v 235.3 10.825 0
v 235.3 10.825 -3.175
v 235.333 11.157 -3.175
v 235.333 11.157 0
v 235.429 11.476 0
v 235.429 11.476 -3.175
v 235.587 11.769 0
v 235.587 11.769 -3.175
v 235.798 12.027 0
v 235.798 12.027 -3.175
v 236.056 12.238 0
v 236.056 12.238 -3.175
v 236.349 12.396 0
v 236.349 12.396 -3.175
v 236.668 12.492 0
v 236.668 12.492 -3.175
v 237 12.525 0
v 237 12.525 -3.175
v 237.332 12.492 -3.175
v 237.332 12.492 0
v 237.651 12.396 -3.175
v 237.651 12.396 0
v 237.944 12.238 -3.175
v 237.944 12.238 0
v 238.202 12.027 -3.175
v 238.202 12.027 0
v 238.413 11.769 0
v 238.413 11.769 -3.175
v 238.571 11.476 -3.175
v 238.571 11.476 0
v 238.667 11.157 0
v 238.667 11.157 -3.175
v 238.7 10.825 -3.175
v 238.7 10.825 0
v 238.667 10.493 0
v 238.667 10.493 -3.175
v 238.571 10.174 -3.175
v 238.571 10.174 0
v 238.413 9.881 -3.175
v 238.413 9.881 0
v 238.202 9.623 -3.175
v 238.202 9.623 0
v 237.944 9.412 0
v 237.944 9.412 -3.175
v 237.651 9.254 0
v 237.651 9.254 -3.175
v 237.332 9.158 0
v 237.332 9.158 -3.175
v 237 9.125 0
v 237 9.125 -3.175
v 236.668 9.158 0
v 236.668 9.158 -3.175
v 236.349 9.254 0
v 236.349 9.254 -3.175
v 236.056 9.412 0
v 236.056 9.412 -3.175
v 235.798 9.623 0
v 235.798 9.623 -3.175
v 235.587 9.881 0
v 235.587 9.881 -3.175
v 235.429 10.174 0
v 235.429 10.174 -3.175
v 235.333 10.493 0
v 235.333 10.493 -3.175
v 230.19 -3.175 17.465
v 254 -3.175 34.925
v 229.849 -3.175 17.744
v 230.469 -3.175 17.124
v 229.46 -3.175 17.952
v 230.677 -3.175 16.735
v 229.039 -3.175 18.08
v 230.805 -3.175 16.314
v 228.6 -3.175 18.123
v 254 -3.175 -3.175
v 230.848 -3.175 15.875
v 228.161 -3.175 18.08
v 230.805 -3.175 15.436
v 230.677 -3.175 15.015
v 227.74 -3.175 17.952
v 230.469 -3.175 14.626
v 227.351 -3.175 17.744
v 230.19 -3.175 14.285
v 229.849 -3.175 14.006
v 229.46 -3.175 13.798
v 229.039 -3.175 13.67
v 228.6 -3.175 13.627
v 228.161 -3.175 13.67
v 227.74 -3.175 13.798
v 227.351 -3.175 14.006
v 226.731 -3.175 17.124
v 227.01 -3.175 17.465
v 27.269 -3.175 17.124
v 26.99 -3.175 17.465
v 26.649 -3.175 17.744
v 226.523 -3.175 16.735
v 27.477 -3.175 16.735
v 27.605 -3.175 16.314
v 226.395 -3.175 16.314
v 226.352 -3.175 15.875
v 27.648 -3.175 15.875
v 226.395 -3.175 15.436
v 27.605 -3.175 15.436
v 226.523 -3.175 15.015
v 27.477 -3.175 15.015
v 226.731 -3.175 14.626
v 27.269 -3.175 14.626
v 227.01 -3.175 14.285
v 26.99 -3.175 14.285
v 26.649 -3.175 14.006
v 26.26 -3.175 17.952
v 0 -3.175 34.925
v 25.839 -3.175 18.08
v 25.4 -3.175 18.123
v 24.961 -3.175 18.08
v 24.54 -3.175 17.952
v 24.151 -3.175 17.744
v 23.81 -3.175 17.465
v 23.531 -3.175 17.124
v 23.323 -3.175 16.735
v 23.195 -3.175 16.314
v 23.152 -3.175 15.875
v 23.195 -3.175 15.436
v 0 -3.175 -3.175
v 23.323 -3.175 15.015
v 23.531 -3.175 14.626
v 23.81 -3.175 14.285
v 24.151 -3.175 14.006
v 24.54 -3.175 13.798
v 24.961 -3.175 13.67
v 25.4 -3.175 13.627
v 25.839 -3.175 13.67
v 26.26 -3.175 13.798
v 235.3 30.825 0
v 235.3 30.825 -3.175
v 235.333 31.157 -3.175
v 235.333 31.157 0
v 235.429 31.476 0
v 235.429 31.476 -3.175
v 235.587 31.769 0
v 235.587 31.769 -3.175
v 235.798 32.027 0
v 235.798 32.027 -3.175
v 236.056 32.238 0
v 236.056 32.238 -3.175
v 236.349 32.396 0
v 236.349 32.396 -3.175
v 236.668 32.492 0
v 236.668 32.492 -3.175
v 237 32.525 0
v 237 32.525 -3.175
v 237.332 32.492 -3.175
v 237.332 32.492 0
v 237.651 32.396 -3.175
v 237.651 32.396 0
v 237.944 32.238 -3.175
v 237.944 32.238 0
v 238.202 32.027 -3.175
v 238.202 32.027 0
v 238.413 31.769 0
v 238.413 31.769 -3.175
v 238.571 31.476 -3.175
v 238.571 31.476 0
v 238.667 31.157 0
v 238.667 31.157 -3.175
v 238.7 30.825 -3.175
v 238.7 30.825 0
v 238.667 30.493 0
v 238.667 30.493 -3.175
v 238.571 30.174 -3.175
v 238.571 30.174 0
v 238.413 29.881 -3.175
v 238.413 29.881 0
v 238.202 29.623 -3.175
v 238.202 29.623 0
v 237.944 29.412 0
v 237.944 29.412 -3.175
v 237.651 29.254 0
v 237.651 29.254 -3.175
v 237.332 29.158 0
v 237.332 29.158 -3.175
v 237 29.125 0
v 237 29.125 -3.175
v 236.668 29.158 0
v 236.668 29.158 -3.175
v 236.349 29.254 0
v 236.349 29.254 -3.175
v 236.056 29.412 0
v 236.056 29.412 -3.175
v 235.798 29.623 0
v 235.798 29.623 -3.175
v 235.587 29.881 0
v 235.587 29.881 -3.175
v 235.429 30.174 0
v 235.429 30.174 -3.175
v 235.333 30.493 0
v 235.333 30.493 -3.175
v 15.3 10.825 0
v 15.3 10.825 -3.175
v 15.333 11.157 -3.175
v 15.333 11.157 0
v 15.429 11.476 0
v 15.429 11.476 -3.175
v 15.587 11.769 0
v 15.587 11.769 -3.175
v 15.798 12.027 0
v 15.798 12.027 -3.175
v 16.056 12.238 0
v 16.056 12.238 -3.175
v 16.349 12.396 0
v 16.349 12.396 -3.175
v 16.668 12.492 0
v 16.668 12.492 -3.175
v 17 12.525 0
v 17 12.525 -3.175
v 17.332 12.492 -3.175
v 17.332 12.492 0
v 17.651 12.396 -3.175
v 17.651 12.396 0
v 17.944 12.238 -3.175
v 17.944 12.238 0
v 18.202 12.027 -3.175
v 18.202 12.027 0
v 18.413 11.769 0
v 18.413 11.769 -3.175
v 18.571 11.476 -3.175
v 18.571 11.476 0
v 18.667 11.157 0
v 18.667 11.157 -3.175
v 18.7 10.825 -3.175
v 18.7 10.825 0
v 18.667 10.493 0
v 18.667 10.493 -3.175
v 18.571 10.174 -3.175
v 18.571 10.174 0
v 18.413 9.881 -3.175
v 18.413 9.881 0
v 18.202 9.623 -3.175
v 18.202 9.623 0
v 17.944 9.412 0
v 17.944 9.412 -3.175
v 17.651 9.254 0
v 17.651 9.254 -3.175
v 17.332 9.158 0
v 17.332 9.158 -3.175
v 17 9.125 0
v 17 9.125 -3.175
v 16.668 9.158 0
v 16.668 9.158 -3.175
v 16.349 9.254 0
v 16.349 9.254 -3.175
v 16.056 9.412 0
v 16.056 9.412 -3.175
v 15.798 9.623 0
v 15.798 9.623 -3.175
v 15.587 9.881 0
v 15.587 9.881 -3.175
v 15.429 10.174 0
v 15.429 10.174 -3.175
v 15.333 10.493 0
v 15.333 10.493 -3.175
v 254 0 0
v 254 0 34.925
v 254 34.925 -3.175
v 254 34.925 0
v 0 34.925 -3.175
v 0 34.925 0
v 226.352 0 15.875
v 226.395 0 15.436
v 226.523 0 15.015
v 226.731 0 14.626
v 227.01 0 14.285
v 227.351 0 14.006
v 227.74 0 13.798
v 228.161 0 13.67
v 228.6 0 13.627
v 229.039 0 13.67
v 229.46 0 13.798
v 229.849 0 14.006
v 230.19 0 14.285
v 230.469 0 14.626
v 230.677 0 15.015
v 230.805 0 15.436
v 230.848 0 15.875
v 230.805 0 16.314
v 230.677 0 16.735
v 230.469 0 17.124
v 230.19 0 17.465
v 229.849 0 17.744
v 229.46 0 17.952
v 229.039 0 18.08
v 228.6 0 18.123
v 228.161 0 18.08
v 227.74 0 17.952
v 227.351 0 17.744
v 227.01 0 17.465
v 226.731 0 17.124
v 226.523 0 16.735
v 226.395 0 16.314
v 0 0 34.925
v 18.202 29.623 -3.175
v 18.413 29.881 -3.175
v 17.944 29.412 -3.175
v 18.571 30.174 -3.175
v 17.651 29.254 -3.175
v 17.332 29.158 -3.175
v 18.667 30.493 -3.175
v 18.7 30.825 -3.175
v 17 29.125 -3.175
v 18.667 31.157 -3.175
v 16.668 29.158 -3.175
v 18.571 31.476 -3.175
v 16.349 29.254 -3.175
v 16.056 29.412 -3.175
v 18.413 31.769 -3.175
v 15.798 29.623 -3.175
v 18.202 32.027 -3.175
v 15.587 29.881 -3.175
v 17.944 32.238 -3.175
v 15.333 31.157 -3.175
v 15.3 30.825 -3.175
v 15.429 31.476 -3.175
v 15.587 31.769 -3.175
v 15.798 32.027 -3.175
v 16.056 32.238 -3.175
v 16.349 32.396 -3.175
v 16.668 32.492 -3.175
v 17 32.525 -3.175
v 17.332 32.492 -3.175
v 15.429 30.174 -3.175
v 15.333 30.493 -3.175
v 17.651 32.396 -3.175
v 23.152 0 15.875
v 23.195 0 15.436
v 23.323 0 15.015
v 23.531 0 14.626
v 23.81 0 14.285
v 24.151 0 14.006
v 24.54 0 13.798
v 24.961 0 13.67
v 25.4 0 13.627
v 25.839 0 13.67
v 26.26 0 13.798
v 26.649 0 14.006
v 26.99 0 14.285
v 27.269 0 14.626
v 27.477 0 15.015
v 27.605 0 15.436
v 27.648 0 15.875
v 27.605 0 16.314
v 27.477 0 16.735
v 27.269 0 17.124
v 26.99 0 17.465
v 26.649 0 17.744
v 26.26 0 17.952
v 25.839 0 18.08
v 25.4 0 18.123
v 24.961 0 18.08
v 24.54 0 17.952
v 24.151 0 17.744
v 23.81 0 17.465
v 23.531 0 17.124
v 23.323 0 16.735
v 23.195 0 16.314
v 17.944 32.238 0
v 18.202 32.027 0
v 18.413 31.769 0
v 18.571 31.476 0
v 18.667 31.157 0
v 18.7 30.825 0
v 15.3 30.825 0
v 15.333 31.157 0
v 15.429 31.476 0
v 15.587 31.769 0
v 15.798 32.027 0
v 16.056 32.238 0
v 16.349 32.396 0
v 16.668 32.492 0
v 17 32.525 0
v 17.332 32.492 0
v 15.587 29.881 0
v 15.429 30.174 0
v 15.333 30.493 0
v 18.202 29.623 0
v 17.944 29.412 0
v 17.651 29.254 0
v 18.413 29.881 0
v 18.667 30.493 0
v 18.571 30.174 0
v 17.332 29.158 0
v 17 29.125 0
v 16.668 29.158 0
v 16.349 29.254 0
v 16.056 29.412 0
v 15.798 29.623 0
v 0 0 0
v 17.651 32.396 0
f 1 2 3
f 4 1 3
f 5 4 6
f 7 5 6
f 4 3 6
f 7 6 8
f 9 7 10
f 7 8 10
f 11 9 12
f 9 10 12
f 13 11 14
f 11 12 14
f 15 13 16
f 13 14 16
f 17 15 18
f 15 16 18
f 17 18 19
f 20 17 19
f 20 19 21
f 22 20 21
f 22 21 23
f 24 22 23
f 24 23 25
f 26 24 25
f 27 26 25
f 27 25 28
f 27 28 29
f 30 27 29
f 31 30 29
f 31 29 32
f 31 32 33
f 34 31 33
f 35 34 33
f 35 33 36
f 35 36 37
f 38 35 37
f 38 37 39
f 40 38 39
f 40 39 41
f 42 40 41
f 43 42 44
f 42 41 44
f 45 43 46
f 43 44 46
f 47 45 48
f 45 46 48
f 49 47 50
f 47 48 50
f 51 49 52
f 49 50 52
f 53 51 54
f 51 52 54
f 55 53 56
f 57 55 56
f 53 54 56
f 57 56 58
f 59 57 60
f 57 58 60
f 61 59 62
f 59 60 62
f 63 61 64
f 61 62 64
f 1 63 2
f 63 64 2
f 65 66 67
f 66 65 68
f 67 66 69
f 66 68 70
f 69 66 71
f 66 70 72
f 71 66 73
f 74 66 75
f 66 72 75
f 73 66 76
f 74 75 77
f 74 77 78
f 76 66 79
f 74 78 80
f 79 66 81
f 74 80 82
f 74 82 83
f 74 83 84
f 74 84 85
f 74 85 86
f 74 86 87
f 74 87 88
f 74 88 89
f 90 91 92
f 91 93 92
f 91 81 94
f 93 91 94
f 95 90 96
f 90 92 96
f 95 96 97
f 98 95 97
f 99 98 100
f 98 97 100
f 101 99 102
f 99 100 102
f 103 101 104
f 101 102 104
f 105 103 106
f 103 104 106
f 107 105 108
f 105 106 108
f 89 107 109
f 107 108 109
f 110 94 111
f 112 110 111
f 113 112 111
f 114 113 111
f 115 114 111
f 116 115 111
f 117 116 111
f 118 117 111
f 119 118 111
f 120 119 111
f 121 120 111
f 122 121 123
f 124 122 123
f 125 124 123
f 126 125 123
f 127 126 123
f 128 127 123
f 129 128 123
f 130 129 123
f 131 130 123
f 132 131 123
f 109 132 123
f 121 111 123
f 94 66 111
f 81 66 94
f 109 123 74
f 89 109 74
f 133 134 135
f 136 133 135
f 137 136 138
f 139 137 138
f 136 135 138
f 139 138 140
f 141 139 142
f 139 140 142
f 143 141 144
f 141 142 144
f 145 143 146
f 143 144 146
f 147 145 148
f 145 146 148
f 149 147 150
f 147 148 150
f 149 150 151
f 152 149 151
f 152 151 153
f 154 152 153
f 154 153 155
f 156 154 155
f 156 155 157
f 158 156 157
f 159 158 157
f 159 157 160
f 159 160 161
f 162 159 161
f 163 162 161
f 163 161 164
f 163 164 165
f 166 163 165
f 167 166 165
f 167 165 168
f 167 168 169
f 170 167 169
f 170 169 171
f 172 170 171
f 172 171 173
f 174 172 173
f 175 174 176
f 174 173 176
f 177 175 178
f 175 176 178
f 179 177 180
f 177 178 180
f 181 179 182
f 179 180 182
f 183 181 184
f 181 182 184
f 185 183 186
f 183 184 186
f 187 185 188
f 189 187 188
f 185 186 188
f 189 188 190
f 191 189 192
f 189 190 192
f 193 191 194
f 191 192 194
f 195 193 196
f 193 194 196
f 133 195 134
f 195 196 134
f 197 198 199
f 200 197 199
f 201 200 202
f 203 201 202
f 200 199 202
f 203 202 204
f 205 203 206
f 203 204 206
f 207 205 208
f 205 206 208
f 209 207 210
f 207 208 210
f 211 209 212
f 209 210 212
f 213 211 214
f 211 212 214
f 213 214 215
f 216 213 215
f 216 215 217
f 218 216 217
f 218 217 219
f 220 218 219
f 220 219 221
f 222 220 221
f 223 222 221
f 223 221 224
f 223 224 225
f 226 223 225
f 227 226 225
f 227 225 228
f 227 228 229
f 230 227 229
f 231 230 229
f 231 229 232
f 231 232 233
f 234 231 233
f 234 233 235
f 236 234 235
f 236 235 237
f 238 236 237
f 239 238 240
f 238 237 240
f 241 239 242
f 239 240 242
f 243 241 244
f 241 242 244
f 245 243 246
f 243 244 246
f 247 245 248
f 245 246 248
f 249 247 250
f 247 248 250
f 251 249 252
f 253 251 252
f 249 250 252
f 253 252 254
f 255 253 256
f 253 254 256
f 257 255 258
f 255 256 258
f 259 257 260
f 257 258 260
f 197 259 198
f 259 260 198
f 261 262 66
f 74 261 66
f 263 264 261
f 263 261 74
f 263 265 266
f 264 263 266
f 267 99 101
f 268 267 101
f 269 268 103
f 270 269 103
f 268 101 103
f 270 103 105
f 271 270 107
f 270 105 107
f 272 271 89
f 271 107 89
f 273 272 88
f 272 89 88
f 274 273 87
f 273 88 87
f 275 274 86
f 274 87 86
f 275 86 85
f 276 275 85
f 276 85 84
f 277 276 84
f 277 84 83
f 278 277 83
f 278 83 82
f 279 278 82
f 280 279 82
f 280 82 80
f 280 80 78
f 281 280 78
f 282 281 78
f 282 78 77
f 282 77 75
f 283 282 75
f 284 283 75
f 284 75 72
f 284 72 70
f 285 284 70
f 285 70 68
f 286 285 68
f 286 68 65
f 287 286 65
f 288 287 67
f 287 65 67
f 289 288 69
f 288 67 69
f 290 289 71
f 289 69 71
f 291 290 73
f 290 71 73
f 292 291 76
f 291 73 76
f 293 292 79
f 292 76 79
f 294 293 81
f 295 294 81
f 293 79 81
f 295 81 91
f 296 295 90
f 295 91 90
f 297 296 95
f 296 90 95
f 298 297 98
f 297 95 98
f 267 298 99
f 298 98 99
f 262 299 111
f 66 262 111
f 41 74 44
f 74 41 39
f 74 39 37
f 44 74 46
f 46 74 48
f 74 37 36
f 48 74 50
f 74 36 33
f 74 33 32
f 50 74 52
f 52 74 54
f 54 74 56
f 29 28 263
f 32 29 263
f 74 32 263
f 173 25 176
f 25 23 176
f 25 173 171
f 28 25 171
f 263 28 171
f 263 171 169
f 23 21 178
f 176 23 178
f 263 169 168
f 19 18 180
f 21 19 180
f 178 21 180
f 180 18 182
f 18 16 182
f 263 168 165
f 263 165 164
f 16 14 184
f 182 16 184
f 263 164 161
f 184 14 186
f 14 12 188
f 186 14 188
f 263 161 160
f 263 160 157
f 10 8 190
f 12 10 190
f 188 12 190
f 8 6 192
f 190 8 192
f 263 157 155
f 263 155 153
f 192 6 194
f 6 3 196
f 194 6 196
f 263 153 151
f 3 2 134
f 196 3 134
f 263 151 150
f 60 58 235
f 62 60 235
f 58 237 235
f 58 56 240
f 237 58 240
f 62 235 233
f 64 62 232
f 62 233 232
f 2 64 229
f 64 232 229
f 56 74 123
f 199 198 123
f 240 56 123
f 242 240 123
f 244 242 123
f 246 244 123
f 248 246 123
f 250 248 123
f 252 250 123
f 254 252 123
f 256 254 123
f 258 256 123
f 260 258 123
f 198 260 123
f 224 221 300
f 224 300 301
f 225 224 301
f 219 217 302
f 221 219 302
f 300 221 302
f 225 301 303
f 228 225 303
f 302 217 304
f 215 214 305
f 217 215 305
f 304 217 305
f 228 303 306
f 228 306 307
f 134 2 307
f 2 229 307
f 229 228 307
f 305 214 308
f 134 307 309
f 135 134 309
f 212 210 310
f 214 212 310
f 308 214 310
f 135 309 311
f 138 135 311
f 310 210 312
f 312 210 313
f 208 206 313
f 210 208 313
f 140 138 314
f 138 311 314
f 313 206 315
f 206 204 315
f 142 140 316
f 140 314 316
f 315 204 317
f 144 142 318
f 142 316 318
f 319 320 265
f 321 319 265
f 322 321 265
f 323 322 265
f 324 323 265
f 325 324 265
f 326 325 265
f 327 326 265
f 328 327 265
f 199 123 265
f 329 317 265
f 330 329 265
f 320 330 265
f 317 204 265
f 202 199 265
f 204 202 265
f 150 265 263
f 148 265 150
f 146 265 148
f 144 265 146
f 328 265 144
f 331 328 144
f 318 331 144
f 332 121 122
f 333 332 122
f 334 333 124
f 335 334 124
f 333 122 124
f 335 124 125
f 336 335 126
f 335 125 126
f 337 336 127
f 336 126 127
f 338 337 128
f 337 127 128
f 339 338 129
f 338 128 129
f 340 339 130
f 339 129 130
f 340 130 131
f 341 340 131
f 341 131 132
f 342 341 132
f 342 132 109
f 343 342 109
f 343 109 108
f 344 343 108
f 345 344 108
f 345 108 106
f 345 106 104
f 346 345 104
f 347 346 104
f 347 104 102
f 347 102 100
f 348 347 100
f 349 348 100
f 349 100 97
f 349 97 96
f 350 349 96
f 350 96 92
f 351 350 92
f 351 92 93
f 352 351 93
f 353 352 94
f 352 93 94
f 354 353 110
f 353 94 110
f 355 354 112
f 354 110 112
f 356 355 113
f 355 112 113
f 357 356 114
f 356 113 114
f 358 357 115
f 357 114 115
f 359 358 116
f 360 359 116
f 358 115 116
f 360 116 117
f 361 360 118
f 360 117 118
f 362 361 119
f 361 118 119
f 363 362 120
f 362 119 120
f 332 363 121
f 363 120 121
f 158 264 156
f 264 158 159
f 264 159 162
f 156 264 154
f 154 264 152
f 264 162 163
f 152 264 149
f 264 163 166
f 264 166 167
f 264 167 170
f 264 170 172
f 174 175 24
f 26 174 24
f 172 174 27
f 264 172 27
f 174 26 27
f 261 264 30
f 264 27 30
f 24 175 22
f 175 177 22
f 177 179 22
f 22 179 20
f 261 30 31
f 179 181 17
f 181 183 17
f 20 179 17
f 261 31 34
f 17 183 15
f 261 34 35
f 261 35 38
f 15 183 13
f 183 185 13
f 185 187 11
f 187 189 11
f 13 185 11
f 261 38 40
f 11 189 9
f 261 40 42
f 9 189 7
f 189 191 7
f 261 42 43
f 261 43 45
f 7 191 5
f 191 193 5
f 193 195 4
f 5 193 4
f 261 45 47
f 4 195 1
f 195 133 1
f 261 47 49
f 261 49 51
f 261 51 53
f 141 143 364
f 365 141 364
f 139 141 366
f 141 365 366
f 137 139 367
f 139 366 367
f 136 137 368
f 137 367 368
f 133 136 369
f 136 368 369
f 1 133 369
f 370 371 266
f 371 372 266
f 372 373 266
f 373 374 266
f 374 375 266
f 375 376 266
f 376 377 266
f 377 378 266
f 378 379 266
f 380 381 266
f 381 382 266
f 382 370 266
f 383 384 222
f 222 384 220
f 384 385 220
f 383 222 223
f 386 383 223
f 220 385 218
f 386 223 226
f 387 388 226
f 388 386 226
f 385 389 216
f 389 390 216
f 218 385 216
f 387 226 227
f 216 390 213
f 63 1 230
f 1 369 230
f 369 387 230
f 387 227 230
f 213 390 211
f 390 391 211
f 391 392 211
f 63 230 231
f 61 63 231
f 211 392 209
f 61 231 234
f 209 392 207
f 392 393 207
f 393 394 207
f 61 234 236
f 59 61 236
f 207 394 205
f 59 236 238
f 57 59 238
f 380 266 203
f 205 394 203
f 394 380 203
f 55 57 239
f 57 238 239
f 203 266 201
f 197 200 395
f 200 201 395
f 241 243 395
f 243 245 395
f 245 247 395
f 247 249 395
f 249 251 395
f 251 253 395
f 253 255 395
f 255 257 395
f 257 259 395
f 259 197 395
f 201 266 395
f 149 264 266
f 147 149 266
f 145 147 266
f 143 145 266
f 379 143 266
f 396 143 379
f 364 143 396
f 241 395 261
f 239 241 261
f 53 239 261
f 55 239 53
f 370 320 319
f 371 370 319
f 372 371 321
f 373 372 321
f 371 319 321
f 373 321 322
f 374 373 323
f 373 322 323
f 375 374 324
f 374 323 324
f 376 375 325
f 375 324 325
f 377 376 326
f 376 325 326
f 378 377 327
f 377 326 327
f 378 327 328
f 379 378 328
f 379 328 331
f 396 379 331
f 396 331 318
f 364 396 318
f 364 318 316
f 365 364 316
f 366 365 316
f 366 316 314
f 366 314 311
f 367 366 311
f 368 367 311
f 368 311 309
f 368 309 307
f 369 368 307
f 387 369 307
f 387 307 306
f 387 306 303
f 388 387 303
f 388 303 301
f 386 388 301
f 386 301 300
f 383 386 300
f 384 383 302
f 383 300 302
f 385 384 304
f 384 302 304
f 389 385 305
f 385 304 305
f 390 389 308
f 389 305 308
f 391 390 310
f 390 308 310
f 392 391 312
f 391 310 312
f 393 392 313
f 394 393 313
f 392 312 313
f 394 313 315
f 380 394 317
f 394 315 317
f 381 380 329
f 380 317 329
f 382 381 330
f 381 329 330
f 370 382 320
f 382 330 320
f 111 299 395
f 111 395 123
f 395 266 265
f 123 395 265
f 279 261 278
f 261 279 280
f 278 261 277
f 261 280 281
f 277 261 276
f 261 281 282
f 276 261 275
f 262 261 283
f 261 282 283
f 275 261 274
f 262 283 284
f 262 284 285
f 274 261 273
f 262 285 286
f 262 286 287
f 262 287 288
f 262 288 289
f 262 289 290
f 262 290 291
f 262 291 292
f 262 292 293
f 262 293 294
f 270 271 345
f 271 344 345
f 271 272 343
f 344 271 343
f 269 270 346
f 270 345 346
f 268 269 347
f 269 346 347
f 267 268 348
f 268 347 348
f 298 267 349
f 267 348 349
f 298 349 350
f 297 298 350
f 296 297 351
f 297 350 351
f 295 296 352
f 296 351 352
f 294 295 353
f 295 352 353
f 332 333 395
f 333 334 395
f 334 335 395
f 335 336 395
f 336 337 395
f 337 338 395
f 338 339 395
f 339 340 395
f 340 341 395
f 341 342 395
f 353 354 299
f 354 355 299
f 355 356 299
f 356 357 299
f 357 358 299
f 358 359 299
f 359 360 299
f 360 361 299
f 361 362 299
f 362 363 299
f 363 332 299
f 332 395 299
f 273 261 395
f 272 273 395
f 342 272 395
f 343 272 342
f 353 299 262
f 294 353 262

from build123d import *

# Parameters (mm, degrees)
BOSS_EXTRUDE1_DEPTH   = 254
M3_CLEARANCE_HOLE1_D  = 3.4
F_8_CLEARANCE_HOLE1_D = 4.4958


with BuildPart() as part:
    # Sketch1 → Boss-Extrude1 (new body)
    with BuildSketch(Plane(origin=(0, 0, 0), x_dir=(0, 0, -1), z_dir=(1, 0, 0))):
        Polygon((0, 0), (-34.925, 0), (-34.925, -3.175), (3.175, -3.175), (3.175, 34.925), (0, 34.925), align=None)
    extrude(amount=BOSS_EXTRUDE1_DEPTH)

    # M3 Clearance Hole1 (through all)
    with Locations(Plane.XY):
        with Locations((17, 30.825), (17, 10.825), (237, 10.825), (237, 30.825)):
            Hole(M3_CLEARANCE_HOLE1_D / 2)

    # #8 Clearance Hole1 (through all)
    with Locations(Plane(origin=(0, 0, 0), x_dir=(1, 0, 0), z_dir=(0, 1, 0))):
        with Locations((25.4, -15.875), (228.6, -15.875)):
            Hole(F_8_CLEARANCE_HOLE1_D / 2)


solid = part.part
